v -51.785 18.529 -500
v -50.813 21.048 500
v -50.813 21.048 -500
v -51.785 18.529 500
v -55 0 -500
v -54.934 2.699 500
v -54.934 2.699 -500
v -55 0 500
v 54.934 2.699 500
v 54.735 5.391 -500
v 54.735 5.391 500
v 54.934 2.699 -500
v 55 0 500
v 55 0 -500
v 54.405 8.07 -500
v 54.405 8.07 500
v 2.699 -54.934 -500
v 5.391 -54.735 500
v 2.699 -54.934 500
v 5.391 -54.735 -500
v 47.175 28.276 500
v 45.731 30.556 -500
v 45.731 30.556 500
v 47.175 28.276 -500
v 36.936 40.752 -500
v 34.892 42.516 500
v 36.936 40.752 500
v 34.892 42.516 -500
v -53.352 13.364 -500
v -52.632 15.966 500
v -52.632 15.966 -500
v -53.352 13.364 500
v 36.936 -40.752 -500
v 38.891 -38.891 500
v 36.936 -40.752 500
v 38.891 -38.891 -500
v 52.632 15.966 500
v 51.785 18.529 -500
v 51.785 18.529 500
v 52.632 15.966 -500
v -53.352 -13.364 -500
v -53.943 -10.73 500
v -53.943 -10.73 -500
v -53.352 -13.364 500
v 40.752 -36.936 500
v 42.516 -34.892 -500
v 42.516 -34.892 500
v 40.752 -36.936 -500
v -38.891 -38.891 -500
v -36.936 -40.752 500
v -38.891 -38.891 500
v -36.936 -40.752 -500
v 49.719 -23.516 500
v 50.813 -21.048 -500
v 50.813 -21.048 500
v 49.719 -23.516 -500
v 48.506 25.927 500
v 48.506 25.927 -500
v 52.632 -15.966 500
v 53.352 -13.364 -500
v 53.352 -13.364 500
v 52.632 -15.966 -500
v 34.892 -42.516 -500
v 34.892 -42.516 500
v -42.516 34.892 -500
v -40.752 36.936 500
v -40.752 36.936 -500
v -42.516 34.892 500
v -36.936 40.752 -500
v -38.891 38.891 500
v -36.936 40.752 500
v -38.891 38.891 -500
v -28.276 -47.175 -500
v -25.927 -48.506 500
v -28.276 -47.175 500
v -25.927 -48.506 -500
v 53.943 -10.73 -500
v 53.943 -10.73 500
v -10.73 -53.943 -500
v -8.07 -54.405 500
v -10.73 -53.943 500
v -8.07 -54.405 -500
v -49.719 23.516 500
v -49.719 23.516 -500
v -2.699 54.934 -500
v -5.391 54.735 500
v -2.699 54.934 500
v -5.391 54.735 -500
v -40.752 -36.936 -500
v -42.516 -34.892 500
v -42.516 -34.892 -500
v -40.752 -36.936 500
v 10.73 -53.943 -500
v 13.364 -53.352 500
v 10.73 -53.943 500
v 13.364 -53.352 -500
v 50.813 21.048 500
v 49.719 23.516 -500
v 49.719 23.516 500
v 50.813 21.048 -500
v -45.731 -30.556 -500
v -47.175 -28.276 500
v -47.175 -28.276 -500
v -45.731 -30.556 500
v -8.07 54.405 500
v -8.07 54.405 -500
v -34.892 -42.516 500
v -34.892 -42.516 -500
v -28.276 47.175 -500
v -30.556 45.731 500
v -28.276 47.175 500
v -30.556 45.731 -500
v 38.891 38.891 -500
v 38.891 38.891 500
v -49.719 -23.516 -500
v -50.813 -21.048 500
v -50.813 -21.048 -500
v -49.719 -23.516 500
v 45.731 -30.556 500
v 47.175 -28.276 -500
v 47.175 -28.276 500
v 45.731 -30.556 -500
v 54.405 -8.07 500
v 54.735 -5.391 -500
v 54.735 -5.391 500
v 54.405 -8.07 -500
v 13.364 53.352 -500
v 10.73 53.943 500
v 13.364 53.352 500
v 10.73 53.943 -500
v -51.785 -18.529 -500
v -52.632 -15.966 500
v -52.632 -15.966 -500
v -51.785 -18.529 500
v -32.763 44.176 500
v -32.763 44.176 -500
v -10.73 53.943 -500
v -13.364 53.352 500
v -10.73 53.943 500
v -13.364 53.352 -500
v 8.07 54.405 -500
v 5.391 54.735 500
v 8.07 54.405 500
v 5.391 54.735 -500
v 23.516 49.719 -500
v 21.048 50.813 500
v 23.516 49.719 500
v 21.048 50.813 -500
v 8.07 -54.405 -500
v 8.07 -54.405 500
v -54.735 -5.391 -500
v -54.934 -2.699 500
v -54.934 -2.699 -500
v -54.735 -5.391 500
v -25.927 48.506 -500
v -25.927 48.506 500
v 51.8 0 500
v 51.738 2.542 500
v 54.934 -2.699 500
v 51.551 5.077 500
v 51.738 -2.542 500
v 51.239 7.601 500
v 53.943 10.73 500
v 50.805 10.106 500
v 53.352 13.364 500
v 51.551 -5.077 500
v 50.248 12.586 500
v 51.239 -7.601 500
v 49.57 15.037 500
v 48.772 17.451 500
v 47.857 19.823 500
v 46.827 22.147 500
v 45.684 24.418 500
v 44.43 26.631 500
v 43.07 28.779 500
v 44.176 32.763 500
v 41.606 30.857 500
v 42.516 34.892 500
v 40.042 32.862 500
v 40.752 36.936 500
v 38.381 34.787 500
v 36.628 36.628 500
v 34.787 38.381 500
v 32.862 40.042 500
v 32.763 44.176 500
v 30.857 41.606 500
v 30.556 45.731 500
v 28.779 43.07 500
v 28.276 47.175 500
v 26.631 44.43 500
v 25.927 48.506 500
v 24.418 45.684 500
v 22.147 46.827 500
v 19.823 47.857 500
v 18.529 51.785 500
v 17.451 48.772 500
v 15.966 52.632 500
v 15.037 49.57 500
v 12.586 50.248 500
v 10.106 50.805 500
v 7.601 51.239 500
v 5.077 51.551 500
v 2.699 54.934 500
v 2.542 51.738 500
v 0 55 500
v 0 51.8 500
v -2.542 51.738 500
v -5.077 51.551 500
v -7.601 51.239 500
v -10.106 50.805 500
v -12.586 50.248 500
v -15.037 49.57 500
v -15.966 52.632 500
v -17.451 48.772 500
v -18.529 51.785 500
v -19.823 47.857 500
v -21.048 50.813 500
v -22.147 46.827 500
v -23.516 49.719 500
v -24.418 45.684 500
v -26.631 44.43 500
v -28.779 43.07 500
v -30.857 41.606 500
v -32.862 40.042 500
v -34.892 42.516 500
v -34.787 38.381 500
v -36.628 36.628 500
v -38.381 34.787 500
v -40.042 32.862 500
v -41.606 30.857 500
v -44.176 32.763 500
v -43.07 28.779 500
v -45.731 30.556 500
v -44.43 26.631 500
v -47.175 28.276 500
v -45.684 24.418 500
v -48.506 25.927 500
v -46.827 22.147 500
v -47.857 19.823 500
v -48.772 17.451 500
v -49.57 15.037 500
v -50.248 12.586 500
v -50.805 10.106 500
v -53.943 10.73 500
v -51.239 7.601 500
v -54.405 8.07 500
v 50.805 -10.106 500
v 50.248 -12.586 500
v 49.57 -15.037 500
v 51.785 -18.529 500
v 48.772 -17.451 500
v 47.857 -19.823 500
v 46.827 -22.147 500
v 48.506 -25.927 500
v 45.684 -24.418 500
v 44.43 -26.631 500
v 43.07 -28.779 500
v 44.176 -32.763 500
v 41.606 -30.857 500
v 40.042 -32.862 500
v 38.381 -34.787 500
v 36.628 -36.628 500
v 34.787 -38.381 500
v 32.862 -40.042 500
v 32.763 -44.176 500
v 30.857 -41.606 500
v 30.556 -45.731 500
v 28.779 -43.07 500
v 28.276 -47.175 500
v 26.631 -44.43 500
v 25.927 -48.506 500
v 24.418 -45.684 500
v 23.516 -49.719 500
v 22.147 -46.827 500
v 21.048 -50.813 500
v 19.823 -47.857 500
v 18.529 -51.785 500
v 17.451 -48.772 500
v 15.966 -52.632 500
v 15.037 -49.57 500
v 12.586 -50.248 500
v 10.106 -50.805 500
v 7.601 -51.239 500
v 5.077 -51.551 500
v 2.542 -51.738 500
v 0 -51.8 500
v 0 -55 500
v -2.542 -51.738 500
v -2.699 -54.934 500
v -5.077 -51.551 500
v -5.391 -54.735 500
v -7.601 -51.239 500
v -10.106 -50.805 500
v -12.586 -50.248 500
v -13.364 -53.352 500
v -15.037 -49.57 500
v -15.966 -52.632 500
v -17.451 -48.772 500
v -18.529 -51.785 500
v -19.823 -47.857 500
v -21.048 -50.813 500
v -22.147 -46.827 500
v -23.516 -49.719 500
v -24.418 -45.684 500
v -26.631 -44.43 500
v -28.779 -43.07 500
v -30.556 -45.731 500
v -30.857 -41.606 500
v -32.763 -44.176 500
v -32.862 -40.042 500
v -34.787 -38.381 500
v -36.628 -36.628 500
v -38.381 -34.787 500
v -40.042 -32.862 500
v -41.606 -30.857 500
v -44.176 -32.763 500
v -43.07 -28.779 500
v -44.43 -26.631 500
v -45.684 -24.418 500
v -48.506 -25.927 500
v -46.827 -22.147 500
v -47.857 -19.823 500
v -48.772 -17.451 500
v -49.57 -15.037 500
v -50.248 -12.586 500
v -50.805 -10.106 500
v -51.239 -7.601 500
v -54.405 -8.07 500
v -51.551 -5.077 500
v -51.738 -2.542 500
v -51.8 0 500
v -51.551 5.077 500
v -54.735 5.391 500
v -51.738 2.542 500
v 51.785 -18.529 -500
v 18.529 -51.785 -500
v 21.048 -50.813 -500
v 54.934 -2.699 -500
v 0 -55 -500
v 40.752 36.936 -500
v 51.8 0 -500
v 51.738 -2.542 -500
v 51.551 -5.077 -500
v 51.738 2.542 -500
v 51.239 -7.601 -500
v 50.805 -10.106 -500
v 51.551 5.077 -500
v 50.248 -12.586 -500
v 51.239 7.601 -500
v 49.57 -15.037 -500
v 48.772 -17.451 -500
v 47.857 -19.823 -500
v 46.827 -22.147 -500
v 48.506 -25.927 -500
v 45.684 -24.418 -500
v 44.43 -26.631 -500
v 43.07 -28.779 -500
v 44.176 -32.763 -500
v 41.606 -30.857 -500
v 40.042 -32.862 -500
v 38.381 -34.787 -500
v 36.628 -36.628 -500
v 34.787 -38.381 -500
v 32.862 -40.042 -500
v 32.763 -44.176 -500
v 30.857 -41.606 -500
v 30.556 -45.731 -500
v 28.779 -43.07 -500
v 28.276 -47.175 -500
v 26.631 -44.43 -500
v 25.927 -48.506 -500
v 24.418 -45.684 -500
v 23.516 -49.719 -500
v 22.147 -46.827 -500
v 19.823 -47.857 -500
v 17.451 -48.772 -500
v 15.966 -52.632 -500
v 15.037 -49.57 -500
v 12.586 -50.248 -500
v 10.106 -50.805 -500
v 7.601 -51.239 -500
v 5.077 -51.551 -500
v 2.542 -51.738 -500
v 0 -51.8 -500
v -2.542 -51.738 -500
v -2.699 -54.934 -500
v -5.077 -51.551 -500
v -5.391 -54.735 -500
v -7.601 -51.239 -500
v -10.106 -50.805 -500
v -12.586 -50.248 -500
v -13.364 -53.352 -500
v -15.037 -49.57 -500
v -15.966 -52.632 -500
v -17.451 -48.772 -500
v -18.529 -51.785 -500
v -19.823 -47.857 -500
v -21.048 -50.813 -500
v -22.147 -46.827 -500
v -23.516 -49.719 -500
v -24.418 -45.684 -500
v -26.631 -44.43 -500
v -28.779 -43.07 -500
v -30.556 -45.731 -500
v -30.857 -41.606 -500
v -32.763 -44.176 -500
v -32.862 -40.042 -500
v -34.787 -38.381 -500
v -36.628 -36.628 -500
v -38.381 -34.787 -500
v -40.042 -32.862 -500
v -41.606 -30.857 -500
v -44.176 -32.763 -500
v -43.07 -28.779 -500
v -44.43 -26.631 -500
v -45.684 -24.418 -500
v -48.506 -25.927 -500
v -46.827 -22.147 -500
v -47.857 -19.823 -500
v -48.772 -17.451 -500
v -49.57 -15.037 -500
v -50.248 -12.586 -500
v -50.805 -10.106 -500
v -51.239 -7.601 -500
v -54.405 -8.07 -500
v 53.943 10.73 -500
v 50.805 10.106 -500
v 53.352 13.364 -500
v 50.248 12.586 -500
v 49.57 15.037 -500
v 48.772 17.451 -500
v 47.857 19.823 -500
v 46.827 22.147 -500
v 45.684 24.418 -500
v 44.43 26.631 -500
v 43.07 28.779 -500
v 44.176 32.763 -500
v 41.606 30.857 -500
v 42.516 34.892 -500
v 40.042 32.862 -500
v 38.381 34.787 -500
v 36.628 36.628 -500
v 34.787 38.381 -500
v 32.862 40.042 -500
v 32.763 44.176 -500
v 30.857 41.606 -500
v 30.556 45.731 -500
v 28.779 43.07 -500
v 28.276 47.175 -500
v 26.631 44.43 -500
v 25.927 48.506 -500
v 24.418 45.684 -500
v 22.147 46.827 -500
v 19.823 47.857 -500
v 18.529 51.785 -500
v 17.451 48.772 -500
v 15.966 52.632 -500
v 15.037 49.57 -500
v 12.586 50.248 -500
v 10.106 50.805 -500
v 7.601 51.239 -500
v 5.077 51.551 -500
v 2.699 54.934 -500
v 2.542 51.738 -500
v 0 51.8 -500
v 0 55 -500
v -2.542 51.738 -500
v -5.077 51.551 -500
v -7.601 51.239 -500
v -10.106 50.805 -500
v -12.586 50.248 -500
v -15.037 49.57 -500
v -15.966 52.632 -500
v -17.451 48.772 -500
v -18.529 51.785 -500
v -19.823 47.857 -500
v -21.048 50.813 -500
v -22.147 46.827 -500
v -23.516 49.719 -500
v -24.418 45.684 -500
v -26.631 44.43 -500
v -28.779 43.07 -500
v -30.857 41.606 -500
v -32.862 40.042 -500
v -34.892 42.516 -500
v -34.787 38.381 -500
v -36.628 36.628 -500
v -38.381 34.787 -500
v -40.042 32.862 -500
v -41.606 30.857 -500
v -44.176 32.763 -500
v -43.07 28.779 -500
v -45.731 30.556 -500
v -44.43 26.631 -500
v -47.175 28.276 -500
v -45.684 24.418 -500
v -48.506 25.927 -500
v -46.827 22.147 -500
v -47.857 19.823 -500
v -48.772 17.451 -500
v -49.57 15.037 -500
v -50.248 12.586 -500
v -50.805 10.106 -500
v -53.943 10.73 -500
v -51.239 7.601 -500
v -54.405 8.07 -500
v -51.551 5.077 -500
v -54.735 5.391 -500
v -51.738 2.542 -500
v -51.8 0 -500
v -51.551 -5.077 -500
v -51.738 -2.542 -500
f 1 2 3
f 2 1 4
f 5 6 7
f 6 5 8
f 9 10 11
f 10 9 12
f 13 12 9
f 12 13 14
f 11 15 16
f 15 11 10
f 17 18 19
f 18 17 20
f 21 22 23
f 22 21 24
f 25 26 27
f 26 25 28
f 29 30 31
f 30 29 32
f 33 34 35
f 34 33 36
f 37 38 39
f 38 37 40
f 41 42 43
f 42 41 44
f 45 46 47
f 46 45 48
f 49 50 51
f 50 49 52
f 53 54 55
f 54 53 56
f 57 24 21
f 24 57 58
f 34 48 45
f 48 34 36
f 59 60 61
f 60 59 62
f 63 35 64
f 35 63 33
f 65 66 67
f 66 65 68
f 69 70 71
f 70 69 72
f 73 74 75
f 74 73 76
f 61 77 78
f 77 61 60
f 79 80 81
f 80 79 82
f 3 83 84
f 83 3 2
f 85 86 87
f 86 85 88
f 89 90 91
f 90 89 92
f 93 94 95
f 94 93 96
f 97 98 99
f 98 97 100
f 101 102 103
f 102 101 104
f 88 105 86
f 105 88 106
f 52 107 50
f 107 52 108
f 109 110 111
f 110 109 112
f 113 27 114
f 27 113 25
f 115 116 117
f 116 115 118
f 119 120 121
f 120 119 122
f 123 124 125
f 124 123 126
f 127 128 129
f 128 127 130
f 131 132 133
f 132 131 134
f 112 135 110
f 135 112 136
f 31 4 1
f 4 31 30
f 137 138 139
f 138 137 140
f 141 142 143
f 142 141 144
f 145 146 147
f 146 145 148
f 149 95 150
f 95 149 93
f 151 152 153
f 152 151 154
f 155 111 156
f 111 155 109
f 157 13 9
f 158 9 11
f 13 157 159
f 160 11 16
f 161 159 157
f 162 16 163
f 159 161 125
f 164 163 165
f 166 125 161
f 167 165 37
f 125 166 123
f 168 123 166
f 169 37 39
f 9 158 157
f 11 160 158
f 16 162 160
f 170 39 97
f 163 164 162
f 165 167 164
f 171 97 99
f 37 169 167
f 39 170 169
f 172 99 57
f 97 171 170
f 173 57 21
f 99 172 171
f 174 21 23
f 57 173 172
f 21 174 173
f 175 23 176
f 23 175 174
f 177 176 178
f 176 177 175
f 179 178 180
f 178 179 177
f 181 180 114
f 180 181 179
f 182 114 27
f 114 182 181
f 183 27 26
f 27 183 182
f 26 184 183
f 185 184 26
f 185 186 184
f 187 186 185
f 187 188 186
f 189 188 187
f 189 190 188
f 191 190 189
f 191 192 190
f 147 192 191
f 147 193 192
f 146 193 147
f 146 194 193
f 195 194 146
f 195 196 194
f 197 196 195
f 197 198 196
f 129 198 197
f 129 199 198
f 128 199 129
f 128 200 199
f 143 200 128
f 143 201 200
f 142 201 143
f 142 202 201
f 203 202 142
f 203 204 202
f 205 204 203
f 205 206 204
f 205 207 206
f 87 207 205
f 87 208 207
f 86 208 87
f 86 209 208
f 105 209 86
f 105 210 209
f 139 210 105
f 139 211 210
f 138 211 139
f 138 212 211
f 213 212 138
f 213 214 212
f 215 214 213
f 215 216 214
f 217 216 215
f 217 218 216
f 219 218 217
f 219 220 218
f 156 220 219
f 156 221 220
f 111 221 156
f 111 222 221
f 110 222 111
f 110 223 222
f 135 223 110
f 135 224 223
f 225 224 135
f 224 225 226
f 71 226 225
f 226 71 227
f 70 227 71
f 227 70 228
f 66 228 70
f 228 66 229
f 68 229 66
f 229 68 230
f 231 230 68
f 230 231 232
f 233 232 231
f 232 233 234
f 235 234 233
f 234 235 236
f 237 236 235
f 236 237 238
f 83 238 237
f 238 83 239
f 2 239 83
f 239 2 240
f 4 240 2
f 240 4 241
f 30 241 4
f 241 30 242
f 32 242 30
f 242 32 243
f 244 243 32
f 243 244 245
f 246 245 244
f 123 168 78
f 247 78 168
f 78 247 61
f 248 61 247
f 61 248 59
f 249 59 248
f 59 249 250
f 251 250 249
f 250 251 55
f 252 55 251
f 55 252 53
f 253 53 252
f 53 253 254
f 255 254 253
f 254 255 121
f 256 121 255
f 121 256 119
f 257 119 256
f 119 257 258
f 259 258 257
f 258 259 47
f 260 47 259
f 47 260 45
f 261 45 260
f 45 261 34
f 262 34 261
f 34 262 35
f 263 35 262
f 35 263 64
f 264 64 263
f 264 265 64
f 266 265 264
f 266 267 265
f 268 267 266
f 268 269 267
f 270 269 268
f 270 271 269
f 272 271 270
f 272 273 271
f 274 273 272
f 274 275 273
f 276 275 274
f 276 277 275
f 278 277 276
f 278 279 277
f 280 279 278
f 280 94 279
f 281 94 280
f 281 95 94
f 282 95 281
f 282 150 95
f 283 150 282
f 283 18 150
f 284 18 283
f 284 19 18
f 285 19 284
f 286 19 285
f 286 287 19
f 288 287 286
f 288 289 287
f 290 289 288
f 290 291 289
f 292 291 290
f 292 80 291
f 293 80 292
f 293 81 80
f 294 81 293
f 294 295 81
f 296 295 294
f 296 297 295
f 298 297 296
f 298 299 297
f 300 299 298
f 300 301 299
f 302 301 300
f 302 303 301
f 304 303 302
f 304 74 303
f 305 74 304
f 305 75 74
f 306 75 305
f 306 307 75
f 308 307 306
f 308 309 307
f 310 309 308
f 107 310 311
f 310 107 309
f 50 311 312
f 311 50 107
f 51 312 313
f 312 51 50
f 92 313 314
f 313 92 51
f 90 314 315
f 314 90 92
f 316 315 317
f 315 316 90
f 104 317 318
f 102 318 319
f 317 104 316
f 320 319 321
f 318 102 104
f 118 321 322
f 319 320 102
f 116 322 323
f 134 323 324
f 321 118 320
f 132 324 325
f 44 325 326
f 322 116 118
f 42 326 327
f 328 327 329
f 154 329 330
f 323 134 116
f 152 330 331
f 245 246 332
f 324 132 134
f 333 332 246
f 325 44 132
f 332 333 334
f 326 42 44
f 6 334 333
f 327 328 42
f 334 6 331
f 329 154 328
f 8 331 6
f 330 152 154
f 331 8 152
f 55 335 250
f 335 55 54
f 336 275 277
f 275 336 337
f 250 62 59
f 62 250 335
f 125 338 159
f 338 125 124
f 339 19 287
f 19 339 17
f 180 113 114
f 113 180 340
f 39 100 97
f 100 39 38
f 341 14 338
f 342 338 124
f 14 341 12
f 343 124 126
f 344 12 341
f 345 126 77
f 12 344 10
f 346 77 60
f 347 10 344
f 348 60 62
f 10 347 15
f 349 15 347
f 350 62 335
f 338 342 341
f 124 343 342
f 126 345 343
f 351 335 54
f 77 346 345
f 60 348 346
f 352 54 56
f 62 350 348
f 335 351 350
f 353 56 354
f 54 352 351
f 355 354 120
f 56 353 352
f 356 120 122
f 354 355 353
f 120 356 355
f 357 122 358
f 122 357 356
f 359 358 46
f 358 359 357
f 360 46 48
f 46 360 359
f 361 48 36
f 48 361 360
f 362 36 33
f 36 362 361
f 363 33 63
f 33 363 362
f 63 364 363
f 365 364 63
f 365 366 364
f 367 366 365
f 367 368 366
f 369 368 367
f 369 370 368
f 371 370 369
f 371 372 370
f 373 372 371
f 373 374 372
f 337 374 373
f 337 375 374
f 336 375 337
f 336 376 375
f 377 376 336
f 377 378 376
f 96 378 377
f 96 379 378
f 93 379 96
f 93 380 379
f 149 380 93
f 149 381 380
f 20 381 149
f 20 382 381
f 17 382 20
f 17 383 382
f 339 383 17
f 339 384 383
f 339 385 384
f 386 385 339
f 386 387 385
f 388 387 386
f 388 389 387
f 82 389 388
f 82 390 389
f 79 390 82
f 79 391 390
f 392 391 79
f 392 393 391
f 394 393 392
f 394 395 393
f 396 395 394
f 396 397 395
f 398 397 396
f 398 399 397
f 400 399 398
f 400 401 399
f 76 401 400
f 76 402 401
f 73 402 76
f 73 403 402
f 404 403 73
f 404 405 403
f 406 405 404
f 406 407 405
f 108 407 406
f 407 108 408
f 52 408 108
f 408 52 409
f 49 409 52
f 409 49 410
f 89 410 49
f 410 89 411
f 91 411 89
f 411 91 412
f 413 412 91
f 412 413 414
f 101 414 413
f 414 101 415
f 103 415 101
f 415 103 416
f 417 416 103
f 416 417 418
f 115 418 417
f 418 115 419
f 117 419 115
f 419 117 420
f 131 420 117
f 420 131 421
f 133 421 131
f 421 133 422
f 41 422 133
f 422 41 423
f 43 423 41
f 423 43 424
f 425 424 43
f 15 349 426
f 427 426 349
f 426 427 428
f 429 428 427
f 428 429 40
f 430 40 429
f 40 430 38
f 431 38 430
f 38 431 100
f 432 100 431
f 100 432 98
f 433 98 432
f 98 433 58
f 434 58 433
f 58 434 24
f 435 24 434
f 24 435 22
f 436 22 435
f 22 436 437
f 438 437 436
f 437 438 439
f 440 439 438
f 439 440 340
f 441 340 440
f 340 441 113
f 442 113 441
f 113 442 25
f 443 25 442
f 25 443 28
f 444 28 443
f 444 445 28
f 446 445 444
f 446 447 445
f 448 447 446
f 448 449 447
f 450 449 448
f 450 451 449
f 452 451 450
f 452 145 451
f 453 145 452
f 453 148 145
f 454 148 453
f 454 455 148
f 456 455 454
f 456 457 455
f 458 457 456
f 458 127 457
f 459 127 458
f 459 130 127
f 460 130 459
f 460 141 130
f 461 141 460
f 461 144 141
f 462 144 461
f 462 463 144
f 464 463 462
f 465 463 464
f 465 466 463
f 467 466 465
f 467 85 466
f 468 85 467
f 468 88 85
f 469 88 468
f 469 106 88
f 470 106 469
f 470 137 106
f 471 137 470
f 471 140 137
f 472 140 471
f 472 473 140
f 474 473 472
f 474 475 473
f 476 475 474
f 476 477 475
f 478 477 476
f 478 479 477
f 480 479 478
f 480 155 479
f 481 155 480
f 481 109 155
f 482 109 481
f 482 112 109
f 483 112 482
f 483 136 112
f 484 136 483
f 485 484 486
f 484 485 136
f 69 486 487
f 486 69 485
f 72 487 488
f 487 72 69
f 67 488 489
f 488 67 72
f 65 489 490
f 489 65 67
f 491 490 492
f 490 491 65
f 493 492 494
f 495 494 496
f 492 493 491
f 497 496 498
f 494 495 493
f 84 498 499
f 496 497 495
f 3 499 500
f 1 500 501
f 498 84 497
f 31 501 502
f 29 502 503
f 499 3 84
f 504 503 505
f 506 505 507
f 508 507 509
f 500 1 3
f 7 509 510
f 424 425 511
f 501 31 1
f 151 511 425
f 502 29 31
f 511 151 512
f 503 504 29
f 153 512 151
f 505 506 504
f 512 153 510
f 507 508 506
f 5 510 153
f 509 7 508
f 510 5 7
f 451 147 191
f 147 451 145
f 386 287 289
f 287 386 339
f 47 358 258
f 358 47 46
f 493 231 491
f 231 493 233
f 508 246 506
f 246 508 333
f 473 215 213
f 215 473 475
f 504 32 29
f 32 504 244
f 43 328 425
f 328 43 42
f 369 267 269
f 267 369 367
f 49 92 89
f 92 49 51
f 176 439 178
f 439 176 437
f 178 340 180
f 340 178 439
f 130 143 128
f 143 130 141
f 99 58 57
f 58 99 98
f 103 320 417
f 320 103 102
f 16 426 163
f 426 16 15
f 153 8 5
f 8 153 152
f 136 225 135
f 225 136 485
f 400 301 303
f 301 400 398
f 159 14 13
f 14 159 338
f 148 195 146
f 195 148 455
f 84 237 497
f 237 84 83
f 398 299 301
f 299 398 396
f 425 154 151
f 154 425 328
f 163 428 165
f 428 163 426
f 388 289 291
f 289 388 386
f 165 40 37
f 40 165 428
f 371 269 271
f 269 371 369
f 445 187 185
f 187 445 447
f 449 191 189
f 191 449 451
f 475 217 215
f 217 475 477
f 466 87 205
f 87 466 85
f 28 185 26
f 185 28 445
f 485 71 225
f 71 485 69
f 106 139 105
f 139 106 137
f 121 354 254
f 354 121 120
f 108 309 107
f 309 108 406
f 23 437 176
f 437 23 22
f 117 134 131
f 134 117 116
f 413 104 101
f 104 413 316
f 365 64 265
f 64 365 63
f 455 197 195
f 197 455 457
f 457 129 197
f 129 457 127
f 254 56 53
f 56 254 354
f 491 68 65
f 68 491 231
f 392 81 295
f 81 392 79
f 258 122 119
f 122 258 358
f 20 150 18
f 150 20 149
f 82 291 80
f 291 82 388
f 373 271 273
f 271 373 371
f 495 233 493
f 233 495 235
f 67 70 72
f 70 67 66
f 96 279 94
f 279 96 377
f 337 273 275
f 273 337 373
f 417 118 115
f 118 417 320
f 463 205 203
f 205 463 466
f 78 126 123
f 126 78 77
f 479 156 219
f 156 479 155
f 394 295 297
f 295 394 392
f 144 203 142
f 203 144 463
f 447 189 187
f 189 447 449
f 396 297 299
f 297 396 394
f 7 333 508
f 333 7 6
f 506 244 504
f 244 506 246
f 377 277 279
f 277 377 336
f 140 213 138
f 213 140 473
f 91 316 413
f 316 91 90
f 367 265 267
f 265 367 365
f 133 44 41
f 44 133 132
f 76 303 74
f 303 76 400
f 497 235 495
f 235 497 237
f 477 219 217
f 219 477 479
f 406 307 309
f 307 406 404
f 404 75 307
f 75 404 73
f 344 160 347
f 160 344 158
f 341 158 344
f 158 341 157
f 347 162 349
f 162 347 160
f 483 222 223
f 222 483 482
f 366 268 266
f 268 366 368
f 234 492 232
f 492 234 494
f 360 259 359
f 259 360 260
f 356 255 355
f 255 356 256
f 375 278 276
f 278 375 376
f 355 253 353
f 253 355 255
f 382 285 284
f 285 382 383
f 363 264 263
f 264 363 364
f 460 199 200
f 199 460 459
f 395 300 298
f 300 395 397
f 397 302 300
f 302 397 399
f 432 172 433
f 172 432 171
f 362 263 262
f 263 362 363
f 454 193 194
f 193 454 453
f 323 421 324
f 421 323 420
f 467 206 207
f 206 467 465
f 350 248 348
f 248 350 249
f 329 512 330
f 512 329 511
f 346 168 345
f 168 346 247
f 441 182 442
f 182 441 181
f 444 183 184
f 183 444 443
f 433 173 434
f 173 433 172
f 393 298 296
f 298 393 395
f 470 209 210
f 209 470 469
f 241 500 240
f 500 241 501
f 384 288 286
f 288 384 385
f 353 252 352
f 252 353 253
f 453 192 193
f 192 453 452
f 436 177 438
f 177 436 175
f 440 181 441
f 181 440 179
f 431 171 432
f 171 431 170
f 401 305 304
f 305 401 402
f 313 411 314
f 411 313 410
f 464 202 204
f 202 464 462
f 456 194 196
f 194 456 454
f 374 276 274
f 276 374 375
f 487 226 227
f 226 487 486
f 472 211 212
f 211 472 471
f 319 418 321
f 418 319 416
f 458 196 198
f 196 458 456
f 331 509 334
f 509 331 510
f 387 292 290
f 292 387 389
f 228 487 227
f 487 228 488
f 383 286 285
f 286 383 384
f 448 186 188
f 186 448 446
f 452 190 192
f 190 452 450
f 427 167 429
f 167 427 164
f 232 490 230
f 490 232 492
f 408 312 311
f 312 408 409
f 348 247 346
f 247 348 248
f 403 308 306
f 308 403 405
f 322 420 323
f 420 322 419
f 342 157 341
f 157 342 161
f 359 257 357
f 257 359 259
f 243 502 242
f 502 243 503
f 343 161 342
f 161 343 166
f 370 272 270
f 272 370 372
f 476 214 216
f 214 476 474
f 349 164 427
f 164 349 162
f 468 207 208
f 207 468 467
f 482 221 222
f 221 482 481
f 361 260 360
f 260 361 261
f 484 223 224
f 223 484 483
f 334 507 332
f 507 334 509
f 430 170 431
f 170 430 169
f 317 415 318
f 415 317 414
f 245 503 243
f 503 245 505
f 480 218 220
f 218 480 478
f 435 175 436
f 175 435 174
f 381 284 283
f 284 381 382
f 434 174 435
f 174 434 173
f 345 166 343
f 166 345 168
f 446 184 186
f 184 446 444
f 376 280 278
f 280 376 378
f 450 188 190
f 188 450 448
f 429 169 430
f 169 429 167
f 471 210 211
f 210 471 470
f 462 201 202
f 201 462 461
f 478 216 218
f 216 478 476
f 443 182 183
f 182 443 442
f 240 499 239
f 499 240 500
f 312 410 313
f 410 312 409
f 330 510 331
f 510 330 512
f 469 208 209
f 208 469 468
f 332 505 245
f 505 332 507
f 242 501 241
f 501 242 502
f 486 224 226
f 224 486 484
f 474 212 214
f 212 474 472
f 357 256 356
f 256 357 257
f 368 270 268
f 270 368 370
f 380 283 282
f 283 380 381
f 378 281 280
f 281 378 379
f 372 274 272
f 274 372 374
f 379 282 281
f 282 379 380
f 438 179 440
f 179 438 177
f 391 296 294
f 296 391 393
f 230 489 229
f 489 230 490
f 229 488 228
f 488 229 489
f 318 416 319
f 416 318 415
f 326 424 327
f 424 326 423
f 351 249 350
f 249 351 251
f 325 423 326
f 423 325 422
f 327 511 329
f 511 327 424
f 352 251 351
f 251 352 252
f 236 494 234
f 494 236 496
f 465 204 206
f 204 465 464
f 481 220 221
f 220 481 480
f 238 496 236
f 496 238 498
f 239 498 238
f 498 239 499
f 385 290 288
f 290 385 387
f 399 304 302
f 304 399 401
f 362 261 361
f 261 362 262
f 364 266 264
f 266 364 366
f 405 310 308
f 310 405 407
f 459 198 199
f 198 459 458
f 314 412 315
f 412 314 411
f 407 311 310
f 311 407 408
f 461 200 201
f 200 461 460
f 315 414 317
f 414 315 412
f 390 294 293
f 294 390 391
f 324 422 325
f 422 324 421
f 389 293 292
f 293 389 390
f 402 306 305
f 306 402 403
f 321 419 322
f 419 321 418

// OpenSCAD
$fn=128;

module ht_pipe(od=110, length=1000, wall=3.2) {
    difference() {
        cylinder(h=length, d=od, center=true);
        cylinder(h=length+2, d=od-2*wall, center=true);
    }
}

ht_pipe(od=110, length=1000, wall=3.2);
